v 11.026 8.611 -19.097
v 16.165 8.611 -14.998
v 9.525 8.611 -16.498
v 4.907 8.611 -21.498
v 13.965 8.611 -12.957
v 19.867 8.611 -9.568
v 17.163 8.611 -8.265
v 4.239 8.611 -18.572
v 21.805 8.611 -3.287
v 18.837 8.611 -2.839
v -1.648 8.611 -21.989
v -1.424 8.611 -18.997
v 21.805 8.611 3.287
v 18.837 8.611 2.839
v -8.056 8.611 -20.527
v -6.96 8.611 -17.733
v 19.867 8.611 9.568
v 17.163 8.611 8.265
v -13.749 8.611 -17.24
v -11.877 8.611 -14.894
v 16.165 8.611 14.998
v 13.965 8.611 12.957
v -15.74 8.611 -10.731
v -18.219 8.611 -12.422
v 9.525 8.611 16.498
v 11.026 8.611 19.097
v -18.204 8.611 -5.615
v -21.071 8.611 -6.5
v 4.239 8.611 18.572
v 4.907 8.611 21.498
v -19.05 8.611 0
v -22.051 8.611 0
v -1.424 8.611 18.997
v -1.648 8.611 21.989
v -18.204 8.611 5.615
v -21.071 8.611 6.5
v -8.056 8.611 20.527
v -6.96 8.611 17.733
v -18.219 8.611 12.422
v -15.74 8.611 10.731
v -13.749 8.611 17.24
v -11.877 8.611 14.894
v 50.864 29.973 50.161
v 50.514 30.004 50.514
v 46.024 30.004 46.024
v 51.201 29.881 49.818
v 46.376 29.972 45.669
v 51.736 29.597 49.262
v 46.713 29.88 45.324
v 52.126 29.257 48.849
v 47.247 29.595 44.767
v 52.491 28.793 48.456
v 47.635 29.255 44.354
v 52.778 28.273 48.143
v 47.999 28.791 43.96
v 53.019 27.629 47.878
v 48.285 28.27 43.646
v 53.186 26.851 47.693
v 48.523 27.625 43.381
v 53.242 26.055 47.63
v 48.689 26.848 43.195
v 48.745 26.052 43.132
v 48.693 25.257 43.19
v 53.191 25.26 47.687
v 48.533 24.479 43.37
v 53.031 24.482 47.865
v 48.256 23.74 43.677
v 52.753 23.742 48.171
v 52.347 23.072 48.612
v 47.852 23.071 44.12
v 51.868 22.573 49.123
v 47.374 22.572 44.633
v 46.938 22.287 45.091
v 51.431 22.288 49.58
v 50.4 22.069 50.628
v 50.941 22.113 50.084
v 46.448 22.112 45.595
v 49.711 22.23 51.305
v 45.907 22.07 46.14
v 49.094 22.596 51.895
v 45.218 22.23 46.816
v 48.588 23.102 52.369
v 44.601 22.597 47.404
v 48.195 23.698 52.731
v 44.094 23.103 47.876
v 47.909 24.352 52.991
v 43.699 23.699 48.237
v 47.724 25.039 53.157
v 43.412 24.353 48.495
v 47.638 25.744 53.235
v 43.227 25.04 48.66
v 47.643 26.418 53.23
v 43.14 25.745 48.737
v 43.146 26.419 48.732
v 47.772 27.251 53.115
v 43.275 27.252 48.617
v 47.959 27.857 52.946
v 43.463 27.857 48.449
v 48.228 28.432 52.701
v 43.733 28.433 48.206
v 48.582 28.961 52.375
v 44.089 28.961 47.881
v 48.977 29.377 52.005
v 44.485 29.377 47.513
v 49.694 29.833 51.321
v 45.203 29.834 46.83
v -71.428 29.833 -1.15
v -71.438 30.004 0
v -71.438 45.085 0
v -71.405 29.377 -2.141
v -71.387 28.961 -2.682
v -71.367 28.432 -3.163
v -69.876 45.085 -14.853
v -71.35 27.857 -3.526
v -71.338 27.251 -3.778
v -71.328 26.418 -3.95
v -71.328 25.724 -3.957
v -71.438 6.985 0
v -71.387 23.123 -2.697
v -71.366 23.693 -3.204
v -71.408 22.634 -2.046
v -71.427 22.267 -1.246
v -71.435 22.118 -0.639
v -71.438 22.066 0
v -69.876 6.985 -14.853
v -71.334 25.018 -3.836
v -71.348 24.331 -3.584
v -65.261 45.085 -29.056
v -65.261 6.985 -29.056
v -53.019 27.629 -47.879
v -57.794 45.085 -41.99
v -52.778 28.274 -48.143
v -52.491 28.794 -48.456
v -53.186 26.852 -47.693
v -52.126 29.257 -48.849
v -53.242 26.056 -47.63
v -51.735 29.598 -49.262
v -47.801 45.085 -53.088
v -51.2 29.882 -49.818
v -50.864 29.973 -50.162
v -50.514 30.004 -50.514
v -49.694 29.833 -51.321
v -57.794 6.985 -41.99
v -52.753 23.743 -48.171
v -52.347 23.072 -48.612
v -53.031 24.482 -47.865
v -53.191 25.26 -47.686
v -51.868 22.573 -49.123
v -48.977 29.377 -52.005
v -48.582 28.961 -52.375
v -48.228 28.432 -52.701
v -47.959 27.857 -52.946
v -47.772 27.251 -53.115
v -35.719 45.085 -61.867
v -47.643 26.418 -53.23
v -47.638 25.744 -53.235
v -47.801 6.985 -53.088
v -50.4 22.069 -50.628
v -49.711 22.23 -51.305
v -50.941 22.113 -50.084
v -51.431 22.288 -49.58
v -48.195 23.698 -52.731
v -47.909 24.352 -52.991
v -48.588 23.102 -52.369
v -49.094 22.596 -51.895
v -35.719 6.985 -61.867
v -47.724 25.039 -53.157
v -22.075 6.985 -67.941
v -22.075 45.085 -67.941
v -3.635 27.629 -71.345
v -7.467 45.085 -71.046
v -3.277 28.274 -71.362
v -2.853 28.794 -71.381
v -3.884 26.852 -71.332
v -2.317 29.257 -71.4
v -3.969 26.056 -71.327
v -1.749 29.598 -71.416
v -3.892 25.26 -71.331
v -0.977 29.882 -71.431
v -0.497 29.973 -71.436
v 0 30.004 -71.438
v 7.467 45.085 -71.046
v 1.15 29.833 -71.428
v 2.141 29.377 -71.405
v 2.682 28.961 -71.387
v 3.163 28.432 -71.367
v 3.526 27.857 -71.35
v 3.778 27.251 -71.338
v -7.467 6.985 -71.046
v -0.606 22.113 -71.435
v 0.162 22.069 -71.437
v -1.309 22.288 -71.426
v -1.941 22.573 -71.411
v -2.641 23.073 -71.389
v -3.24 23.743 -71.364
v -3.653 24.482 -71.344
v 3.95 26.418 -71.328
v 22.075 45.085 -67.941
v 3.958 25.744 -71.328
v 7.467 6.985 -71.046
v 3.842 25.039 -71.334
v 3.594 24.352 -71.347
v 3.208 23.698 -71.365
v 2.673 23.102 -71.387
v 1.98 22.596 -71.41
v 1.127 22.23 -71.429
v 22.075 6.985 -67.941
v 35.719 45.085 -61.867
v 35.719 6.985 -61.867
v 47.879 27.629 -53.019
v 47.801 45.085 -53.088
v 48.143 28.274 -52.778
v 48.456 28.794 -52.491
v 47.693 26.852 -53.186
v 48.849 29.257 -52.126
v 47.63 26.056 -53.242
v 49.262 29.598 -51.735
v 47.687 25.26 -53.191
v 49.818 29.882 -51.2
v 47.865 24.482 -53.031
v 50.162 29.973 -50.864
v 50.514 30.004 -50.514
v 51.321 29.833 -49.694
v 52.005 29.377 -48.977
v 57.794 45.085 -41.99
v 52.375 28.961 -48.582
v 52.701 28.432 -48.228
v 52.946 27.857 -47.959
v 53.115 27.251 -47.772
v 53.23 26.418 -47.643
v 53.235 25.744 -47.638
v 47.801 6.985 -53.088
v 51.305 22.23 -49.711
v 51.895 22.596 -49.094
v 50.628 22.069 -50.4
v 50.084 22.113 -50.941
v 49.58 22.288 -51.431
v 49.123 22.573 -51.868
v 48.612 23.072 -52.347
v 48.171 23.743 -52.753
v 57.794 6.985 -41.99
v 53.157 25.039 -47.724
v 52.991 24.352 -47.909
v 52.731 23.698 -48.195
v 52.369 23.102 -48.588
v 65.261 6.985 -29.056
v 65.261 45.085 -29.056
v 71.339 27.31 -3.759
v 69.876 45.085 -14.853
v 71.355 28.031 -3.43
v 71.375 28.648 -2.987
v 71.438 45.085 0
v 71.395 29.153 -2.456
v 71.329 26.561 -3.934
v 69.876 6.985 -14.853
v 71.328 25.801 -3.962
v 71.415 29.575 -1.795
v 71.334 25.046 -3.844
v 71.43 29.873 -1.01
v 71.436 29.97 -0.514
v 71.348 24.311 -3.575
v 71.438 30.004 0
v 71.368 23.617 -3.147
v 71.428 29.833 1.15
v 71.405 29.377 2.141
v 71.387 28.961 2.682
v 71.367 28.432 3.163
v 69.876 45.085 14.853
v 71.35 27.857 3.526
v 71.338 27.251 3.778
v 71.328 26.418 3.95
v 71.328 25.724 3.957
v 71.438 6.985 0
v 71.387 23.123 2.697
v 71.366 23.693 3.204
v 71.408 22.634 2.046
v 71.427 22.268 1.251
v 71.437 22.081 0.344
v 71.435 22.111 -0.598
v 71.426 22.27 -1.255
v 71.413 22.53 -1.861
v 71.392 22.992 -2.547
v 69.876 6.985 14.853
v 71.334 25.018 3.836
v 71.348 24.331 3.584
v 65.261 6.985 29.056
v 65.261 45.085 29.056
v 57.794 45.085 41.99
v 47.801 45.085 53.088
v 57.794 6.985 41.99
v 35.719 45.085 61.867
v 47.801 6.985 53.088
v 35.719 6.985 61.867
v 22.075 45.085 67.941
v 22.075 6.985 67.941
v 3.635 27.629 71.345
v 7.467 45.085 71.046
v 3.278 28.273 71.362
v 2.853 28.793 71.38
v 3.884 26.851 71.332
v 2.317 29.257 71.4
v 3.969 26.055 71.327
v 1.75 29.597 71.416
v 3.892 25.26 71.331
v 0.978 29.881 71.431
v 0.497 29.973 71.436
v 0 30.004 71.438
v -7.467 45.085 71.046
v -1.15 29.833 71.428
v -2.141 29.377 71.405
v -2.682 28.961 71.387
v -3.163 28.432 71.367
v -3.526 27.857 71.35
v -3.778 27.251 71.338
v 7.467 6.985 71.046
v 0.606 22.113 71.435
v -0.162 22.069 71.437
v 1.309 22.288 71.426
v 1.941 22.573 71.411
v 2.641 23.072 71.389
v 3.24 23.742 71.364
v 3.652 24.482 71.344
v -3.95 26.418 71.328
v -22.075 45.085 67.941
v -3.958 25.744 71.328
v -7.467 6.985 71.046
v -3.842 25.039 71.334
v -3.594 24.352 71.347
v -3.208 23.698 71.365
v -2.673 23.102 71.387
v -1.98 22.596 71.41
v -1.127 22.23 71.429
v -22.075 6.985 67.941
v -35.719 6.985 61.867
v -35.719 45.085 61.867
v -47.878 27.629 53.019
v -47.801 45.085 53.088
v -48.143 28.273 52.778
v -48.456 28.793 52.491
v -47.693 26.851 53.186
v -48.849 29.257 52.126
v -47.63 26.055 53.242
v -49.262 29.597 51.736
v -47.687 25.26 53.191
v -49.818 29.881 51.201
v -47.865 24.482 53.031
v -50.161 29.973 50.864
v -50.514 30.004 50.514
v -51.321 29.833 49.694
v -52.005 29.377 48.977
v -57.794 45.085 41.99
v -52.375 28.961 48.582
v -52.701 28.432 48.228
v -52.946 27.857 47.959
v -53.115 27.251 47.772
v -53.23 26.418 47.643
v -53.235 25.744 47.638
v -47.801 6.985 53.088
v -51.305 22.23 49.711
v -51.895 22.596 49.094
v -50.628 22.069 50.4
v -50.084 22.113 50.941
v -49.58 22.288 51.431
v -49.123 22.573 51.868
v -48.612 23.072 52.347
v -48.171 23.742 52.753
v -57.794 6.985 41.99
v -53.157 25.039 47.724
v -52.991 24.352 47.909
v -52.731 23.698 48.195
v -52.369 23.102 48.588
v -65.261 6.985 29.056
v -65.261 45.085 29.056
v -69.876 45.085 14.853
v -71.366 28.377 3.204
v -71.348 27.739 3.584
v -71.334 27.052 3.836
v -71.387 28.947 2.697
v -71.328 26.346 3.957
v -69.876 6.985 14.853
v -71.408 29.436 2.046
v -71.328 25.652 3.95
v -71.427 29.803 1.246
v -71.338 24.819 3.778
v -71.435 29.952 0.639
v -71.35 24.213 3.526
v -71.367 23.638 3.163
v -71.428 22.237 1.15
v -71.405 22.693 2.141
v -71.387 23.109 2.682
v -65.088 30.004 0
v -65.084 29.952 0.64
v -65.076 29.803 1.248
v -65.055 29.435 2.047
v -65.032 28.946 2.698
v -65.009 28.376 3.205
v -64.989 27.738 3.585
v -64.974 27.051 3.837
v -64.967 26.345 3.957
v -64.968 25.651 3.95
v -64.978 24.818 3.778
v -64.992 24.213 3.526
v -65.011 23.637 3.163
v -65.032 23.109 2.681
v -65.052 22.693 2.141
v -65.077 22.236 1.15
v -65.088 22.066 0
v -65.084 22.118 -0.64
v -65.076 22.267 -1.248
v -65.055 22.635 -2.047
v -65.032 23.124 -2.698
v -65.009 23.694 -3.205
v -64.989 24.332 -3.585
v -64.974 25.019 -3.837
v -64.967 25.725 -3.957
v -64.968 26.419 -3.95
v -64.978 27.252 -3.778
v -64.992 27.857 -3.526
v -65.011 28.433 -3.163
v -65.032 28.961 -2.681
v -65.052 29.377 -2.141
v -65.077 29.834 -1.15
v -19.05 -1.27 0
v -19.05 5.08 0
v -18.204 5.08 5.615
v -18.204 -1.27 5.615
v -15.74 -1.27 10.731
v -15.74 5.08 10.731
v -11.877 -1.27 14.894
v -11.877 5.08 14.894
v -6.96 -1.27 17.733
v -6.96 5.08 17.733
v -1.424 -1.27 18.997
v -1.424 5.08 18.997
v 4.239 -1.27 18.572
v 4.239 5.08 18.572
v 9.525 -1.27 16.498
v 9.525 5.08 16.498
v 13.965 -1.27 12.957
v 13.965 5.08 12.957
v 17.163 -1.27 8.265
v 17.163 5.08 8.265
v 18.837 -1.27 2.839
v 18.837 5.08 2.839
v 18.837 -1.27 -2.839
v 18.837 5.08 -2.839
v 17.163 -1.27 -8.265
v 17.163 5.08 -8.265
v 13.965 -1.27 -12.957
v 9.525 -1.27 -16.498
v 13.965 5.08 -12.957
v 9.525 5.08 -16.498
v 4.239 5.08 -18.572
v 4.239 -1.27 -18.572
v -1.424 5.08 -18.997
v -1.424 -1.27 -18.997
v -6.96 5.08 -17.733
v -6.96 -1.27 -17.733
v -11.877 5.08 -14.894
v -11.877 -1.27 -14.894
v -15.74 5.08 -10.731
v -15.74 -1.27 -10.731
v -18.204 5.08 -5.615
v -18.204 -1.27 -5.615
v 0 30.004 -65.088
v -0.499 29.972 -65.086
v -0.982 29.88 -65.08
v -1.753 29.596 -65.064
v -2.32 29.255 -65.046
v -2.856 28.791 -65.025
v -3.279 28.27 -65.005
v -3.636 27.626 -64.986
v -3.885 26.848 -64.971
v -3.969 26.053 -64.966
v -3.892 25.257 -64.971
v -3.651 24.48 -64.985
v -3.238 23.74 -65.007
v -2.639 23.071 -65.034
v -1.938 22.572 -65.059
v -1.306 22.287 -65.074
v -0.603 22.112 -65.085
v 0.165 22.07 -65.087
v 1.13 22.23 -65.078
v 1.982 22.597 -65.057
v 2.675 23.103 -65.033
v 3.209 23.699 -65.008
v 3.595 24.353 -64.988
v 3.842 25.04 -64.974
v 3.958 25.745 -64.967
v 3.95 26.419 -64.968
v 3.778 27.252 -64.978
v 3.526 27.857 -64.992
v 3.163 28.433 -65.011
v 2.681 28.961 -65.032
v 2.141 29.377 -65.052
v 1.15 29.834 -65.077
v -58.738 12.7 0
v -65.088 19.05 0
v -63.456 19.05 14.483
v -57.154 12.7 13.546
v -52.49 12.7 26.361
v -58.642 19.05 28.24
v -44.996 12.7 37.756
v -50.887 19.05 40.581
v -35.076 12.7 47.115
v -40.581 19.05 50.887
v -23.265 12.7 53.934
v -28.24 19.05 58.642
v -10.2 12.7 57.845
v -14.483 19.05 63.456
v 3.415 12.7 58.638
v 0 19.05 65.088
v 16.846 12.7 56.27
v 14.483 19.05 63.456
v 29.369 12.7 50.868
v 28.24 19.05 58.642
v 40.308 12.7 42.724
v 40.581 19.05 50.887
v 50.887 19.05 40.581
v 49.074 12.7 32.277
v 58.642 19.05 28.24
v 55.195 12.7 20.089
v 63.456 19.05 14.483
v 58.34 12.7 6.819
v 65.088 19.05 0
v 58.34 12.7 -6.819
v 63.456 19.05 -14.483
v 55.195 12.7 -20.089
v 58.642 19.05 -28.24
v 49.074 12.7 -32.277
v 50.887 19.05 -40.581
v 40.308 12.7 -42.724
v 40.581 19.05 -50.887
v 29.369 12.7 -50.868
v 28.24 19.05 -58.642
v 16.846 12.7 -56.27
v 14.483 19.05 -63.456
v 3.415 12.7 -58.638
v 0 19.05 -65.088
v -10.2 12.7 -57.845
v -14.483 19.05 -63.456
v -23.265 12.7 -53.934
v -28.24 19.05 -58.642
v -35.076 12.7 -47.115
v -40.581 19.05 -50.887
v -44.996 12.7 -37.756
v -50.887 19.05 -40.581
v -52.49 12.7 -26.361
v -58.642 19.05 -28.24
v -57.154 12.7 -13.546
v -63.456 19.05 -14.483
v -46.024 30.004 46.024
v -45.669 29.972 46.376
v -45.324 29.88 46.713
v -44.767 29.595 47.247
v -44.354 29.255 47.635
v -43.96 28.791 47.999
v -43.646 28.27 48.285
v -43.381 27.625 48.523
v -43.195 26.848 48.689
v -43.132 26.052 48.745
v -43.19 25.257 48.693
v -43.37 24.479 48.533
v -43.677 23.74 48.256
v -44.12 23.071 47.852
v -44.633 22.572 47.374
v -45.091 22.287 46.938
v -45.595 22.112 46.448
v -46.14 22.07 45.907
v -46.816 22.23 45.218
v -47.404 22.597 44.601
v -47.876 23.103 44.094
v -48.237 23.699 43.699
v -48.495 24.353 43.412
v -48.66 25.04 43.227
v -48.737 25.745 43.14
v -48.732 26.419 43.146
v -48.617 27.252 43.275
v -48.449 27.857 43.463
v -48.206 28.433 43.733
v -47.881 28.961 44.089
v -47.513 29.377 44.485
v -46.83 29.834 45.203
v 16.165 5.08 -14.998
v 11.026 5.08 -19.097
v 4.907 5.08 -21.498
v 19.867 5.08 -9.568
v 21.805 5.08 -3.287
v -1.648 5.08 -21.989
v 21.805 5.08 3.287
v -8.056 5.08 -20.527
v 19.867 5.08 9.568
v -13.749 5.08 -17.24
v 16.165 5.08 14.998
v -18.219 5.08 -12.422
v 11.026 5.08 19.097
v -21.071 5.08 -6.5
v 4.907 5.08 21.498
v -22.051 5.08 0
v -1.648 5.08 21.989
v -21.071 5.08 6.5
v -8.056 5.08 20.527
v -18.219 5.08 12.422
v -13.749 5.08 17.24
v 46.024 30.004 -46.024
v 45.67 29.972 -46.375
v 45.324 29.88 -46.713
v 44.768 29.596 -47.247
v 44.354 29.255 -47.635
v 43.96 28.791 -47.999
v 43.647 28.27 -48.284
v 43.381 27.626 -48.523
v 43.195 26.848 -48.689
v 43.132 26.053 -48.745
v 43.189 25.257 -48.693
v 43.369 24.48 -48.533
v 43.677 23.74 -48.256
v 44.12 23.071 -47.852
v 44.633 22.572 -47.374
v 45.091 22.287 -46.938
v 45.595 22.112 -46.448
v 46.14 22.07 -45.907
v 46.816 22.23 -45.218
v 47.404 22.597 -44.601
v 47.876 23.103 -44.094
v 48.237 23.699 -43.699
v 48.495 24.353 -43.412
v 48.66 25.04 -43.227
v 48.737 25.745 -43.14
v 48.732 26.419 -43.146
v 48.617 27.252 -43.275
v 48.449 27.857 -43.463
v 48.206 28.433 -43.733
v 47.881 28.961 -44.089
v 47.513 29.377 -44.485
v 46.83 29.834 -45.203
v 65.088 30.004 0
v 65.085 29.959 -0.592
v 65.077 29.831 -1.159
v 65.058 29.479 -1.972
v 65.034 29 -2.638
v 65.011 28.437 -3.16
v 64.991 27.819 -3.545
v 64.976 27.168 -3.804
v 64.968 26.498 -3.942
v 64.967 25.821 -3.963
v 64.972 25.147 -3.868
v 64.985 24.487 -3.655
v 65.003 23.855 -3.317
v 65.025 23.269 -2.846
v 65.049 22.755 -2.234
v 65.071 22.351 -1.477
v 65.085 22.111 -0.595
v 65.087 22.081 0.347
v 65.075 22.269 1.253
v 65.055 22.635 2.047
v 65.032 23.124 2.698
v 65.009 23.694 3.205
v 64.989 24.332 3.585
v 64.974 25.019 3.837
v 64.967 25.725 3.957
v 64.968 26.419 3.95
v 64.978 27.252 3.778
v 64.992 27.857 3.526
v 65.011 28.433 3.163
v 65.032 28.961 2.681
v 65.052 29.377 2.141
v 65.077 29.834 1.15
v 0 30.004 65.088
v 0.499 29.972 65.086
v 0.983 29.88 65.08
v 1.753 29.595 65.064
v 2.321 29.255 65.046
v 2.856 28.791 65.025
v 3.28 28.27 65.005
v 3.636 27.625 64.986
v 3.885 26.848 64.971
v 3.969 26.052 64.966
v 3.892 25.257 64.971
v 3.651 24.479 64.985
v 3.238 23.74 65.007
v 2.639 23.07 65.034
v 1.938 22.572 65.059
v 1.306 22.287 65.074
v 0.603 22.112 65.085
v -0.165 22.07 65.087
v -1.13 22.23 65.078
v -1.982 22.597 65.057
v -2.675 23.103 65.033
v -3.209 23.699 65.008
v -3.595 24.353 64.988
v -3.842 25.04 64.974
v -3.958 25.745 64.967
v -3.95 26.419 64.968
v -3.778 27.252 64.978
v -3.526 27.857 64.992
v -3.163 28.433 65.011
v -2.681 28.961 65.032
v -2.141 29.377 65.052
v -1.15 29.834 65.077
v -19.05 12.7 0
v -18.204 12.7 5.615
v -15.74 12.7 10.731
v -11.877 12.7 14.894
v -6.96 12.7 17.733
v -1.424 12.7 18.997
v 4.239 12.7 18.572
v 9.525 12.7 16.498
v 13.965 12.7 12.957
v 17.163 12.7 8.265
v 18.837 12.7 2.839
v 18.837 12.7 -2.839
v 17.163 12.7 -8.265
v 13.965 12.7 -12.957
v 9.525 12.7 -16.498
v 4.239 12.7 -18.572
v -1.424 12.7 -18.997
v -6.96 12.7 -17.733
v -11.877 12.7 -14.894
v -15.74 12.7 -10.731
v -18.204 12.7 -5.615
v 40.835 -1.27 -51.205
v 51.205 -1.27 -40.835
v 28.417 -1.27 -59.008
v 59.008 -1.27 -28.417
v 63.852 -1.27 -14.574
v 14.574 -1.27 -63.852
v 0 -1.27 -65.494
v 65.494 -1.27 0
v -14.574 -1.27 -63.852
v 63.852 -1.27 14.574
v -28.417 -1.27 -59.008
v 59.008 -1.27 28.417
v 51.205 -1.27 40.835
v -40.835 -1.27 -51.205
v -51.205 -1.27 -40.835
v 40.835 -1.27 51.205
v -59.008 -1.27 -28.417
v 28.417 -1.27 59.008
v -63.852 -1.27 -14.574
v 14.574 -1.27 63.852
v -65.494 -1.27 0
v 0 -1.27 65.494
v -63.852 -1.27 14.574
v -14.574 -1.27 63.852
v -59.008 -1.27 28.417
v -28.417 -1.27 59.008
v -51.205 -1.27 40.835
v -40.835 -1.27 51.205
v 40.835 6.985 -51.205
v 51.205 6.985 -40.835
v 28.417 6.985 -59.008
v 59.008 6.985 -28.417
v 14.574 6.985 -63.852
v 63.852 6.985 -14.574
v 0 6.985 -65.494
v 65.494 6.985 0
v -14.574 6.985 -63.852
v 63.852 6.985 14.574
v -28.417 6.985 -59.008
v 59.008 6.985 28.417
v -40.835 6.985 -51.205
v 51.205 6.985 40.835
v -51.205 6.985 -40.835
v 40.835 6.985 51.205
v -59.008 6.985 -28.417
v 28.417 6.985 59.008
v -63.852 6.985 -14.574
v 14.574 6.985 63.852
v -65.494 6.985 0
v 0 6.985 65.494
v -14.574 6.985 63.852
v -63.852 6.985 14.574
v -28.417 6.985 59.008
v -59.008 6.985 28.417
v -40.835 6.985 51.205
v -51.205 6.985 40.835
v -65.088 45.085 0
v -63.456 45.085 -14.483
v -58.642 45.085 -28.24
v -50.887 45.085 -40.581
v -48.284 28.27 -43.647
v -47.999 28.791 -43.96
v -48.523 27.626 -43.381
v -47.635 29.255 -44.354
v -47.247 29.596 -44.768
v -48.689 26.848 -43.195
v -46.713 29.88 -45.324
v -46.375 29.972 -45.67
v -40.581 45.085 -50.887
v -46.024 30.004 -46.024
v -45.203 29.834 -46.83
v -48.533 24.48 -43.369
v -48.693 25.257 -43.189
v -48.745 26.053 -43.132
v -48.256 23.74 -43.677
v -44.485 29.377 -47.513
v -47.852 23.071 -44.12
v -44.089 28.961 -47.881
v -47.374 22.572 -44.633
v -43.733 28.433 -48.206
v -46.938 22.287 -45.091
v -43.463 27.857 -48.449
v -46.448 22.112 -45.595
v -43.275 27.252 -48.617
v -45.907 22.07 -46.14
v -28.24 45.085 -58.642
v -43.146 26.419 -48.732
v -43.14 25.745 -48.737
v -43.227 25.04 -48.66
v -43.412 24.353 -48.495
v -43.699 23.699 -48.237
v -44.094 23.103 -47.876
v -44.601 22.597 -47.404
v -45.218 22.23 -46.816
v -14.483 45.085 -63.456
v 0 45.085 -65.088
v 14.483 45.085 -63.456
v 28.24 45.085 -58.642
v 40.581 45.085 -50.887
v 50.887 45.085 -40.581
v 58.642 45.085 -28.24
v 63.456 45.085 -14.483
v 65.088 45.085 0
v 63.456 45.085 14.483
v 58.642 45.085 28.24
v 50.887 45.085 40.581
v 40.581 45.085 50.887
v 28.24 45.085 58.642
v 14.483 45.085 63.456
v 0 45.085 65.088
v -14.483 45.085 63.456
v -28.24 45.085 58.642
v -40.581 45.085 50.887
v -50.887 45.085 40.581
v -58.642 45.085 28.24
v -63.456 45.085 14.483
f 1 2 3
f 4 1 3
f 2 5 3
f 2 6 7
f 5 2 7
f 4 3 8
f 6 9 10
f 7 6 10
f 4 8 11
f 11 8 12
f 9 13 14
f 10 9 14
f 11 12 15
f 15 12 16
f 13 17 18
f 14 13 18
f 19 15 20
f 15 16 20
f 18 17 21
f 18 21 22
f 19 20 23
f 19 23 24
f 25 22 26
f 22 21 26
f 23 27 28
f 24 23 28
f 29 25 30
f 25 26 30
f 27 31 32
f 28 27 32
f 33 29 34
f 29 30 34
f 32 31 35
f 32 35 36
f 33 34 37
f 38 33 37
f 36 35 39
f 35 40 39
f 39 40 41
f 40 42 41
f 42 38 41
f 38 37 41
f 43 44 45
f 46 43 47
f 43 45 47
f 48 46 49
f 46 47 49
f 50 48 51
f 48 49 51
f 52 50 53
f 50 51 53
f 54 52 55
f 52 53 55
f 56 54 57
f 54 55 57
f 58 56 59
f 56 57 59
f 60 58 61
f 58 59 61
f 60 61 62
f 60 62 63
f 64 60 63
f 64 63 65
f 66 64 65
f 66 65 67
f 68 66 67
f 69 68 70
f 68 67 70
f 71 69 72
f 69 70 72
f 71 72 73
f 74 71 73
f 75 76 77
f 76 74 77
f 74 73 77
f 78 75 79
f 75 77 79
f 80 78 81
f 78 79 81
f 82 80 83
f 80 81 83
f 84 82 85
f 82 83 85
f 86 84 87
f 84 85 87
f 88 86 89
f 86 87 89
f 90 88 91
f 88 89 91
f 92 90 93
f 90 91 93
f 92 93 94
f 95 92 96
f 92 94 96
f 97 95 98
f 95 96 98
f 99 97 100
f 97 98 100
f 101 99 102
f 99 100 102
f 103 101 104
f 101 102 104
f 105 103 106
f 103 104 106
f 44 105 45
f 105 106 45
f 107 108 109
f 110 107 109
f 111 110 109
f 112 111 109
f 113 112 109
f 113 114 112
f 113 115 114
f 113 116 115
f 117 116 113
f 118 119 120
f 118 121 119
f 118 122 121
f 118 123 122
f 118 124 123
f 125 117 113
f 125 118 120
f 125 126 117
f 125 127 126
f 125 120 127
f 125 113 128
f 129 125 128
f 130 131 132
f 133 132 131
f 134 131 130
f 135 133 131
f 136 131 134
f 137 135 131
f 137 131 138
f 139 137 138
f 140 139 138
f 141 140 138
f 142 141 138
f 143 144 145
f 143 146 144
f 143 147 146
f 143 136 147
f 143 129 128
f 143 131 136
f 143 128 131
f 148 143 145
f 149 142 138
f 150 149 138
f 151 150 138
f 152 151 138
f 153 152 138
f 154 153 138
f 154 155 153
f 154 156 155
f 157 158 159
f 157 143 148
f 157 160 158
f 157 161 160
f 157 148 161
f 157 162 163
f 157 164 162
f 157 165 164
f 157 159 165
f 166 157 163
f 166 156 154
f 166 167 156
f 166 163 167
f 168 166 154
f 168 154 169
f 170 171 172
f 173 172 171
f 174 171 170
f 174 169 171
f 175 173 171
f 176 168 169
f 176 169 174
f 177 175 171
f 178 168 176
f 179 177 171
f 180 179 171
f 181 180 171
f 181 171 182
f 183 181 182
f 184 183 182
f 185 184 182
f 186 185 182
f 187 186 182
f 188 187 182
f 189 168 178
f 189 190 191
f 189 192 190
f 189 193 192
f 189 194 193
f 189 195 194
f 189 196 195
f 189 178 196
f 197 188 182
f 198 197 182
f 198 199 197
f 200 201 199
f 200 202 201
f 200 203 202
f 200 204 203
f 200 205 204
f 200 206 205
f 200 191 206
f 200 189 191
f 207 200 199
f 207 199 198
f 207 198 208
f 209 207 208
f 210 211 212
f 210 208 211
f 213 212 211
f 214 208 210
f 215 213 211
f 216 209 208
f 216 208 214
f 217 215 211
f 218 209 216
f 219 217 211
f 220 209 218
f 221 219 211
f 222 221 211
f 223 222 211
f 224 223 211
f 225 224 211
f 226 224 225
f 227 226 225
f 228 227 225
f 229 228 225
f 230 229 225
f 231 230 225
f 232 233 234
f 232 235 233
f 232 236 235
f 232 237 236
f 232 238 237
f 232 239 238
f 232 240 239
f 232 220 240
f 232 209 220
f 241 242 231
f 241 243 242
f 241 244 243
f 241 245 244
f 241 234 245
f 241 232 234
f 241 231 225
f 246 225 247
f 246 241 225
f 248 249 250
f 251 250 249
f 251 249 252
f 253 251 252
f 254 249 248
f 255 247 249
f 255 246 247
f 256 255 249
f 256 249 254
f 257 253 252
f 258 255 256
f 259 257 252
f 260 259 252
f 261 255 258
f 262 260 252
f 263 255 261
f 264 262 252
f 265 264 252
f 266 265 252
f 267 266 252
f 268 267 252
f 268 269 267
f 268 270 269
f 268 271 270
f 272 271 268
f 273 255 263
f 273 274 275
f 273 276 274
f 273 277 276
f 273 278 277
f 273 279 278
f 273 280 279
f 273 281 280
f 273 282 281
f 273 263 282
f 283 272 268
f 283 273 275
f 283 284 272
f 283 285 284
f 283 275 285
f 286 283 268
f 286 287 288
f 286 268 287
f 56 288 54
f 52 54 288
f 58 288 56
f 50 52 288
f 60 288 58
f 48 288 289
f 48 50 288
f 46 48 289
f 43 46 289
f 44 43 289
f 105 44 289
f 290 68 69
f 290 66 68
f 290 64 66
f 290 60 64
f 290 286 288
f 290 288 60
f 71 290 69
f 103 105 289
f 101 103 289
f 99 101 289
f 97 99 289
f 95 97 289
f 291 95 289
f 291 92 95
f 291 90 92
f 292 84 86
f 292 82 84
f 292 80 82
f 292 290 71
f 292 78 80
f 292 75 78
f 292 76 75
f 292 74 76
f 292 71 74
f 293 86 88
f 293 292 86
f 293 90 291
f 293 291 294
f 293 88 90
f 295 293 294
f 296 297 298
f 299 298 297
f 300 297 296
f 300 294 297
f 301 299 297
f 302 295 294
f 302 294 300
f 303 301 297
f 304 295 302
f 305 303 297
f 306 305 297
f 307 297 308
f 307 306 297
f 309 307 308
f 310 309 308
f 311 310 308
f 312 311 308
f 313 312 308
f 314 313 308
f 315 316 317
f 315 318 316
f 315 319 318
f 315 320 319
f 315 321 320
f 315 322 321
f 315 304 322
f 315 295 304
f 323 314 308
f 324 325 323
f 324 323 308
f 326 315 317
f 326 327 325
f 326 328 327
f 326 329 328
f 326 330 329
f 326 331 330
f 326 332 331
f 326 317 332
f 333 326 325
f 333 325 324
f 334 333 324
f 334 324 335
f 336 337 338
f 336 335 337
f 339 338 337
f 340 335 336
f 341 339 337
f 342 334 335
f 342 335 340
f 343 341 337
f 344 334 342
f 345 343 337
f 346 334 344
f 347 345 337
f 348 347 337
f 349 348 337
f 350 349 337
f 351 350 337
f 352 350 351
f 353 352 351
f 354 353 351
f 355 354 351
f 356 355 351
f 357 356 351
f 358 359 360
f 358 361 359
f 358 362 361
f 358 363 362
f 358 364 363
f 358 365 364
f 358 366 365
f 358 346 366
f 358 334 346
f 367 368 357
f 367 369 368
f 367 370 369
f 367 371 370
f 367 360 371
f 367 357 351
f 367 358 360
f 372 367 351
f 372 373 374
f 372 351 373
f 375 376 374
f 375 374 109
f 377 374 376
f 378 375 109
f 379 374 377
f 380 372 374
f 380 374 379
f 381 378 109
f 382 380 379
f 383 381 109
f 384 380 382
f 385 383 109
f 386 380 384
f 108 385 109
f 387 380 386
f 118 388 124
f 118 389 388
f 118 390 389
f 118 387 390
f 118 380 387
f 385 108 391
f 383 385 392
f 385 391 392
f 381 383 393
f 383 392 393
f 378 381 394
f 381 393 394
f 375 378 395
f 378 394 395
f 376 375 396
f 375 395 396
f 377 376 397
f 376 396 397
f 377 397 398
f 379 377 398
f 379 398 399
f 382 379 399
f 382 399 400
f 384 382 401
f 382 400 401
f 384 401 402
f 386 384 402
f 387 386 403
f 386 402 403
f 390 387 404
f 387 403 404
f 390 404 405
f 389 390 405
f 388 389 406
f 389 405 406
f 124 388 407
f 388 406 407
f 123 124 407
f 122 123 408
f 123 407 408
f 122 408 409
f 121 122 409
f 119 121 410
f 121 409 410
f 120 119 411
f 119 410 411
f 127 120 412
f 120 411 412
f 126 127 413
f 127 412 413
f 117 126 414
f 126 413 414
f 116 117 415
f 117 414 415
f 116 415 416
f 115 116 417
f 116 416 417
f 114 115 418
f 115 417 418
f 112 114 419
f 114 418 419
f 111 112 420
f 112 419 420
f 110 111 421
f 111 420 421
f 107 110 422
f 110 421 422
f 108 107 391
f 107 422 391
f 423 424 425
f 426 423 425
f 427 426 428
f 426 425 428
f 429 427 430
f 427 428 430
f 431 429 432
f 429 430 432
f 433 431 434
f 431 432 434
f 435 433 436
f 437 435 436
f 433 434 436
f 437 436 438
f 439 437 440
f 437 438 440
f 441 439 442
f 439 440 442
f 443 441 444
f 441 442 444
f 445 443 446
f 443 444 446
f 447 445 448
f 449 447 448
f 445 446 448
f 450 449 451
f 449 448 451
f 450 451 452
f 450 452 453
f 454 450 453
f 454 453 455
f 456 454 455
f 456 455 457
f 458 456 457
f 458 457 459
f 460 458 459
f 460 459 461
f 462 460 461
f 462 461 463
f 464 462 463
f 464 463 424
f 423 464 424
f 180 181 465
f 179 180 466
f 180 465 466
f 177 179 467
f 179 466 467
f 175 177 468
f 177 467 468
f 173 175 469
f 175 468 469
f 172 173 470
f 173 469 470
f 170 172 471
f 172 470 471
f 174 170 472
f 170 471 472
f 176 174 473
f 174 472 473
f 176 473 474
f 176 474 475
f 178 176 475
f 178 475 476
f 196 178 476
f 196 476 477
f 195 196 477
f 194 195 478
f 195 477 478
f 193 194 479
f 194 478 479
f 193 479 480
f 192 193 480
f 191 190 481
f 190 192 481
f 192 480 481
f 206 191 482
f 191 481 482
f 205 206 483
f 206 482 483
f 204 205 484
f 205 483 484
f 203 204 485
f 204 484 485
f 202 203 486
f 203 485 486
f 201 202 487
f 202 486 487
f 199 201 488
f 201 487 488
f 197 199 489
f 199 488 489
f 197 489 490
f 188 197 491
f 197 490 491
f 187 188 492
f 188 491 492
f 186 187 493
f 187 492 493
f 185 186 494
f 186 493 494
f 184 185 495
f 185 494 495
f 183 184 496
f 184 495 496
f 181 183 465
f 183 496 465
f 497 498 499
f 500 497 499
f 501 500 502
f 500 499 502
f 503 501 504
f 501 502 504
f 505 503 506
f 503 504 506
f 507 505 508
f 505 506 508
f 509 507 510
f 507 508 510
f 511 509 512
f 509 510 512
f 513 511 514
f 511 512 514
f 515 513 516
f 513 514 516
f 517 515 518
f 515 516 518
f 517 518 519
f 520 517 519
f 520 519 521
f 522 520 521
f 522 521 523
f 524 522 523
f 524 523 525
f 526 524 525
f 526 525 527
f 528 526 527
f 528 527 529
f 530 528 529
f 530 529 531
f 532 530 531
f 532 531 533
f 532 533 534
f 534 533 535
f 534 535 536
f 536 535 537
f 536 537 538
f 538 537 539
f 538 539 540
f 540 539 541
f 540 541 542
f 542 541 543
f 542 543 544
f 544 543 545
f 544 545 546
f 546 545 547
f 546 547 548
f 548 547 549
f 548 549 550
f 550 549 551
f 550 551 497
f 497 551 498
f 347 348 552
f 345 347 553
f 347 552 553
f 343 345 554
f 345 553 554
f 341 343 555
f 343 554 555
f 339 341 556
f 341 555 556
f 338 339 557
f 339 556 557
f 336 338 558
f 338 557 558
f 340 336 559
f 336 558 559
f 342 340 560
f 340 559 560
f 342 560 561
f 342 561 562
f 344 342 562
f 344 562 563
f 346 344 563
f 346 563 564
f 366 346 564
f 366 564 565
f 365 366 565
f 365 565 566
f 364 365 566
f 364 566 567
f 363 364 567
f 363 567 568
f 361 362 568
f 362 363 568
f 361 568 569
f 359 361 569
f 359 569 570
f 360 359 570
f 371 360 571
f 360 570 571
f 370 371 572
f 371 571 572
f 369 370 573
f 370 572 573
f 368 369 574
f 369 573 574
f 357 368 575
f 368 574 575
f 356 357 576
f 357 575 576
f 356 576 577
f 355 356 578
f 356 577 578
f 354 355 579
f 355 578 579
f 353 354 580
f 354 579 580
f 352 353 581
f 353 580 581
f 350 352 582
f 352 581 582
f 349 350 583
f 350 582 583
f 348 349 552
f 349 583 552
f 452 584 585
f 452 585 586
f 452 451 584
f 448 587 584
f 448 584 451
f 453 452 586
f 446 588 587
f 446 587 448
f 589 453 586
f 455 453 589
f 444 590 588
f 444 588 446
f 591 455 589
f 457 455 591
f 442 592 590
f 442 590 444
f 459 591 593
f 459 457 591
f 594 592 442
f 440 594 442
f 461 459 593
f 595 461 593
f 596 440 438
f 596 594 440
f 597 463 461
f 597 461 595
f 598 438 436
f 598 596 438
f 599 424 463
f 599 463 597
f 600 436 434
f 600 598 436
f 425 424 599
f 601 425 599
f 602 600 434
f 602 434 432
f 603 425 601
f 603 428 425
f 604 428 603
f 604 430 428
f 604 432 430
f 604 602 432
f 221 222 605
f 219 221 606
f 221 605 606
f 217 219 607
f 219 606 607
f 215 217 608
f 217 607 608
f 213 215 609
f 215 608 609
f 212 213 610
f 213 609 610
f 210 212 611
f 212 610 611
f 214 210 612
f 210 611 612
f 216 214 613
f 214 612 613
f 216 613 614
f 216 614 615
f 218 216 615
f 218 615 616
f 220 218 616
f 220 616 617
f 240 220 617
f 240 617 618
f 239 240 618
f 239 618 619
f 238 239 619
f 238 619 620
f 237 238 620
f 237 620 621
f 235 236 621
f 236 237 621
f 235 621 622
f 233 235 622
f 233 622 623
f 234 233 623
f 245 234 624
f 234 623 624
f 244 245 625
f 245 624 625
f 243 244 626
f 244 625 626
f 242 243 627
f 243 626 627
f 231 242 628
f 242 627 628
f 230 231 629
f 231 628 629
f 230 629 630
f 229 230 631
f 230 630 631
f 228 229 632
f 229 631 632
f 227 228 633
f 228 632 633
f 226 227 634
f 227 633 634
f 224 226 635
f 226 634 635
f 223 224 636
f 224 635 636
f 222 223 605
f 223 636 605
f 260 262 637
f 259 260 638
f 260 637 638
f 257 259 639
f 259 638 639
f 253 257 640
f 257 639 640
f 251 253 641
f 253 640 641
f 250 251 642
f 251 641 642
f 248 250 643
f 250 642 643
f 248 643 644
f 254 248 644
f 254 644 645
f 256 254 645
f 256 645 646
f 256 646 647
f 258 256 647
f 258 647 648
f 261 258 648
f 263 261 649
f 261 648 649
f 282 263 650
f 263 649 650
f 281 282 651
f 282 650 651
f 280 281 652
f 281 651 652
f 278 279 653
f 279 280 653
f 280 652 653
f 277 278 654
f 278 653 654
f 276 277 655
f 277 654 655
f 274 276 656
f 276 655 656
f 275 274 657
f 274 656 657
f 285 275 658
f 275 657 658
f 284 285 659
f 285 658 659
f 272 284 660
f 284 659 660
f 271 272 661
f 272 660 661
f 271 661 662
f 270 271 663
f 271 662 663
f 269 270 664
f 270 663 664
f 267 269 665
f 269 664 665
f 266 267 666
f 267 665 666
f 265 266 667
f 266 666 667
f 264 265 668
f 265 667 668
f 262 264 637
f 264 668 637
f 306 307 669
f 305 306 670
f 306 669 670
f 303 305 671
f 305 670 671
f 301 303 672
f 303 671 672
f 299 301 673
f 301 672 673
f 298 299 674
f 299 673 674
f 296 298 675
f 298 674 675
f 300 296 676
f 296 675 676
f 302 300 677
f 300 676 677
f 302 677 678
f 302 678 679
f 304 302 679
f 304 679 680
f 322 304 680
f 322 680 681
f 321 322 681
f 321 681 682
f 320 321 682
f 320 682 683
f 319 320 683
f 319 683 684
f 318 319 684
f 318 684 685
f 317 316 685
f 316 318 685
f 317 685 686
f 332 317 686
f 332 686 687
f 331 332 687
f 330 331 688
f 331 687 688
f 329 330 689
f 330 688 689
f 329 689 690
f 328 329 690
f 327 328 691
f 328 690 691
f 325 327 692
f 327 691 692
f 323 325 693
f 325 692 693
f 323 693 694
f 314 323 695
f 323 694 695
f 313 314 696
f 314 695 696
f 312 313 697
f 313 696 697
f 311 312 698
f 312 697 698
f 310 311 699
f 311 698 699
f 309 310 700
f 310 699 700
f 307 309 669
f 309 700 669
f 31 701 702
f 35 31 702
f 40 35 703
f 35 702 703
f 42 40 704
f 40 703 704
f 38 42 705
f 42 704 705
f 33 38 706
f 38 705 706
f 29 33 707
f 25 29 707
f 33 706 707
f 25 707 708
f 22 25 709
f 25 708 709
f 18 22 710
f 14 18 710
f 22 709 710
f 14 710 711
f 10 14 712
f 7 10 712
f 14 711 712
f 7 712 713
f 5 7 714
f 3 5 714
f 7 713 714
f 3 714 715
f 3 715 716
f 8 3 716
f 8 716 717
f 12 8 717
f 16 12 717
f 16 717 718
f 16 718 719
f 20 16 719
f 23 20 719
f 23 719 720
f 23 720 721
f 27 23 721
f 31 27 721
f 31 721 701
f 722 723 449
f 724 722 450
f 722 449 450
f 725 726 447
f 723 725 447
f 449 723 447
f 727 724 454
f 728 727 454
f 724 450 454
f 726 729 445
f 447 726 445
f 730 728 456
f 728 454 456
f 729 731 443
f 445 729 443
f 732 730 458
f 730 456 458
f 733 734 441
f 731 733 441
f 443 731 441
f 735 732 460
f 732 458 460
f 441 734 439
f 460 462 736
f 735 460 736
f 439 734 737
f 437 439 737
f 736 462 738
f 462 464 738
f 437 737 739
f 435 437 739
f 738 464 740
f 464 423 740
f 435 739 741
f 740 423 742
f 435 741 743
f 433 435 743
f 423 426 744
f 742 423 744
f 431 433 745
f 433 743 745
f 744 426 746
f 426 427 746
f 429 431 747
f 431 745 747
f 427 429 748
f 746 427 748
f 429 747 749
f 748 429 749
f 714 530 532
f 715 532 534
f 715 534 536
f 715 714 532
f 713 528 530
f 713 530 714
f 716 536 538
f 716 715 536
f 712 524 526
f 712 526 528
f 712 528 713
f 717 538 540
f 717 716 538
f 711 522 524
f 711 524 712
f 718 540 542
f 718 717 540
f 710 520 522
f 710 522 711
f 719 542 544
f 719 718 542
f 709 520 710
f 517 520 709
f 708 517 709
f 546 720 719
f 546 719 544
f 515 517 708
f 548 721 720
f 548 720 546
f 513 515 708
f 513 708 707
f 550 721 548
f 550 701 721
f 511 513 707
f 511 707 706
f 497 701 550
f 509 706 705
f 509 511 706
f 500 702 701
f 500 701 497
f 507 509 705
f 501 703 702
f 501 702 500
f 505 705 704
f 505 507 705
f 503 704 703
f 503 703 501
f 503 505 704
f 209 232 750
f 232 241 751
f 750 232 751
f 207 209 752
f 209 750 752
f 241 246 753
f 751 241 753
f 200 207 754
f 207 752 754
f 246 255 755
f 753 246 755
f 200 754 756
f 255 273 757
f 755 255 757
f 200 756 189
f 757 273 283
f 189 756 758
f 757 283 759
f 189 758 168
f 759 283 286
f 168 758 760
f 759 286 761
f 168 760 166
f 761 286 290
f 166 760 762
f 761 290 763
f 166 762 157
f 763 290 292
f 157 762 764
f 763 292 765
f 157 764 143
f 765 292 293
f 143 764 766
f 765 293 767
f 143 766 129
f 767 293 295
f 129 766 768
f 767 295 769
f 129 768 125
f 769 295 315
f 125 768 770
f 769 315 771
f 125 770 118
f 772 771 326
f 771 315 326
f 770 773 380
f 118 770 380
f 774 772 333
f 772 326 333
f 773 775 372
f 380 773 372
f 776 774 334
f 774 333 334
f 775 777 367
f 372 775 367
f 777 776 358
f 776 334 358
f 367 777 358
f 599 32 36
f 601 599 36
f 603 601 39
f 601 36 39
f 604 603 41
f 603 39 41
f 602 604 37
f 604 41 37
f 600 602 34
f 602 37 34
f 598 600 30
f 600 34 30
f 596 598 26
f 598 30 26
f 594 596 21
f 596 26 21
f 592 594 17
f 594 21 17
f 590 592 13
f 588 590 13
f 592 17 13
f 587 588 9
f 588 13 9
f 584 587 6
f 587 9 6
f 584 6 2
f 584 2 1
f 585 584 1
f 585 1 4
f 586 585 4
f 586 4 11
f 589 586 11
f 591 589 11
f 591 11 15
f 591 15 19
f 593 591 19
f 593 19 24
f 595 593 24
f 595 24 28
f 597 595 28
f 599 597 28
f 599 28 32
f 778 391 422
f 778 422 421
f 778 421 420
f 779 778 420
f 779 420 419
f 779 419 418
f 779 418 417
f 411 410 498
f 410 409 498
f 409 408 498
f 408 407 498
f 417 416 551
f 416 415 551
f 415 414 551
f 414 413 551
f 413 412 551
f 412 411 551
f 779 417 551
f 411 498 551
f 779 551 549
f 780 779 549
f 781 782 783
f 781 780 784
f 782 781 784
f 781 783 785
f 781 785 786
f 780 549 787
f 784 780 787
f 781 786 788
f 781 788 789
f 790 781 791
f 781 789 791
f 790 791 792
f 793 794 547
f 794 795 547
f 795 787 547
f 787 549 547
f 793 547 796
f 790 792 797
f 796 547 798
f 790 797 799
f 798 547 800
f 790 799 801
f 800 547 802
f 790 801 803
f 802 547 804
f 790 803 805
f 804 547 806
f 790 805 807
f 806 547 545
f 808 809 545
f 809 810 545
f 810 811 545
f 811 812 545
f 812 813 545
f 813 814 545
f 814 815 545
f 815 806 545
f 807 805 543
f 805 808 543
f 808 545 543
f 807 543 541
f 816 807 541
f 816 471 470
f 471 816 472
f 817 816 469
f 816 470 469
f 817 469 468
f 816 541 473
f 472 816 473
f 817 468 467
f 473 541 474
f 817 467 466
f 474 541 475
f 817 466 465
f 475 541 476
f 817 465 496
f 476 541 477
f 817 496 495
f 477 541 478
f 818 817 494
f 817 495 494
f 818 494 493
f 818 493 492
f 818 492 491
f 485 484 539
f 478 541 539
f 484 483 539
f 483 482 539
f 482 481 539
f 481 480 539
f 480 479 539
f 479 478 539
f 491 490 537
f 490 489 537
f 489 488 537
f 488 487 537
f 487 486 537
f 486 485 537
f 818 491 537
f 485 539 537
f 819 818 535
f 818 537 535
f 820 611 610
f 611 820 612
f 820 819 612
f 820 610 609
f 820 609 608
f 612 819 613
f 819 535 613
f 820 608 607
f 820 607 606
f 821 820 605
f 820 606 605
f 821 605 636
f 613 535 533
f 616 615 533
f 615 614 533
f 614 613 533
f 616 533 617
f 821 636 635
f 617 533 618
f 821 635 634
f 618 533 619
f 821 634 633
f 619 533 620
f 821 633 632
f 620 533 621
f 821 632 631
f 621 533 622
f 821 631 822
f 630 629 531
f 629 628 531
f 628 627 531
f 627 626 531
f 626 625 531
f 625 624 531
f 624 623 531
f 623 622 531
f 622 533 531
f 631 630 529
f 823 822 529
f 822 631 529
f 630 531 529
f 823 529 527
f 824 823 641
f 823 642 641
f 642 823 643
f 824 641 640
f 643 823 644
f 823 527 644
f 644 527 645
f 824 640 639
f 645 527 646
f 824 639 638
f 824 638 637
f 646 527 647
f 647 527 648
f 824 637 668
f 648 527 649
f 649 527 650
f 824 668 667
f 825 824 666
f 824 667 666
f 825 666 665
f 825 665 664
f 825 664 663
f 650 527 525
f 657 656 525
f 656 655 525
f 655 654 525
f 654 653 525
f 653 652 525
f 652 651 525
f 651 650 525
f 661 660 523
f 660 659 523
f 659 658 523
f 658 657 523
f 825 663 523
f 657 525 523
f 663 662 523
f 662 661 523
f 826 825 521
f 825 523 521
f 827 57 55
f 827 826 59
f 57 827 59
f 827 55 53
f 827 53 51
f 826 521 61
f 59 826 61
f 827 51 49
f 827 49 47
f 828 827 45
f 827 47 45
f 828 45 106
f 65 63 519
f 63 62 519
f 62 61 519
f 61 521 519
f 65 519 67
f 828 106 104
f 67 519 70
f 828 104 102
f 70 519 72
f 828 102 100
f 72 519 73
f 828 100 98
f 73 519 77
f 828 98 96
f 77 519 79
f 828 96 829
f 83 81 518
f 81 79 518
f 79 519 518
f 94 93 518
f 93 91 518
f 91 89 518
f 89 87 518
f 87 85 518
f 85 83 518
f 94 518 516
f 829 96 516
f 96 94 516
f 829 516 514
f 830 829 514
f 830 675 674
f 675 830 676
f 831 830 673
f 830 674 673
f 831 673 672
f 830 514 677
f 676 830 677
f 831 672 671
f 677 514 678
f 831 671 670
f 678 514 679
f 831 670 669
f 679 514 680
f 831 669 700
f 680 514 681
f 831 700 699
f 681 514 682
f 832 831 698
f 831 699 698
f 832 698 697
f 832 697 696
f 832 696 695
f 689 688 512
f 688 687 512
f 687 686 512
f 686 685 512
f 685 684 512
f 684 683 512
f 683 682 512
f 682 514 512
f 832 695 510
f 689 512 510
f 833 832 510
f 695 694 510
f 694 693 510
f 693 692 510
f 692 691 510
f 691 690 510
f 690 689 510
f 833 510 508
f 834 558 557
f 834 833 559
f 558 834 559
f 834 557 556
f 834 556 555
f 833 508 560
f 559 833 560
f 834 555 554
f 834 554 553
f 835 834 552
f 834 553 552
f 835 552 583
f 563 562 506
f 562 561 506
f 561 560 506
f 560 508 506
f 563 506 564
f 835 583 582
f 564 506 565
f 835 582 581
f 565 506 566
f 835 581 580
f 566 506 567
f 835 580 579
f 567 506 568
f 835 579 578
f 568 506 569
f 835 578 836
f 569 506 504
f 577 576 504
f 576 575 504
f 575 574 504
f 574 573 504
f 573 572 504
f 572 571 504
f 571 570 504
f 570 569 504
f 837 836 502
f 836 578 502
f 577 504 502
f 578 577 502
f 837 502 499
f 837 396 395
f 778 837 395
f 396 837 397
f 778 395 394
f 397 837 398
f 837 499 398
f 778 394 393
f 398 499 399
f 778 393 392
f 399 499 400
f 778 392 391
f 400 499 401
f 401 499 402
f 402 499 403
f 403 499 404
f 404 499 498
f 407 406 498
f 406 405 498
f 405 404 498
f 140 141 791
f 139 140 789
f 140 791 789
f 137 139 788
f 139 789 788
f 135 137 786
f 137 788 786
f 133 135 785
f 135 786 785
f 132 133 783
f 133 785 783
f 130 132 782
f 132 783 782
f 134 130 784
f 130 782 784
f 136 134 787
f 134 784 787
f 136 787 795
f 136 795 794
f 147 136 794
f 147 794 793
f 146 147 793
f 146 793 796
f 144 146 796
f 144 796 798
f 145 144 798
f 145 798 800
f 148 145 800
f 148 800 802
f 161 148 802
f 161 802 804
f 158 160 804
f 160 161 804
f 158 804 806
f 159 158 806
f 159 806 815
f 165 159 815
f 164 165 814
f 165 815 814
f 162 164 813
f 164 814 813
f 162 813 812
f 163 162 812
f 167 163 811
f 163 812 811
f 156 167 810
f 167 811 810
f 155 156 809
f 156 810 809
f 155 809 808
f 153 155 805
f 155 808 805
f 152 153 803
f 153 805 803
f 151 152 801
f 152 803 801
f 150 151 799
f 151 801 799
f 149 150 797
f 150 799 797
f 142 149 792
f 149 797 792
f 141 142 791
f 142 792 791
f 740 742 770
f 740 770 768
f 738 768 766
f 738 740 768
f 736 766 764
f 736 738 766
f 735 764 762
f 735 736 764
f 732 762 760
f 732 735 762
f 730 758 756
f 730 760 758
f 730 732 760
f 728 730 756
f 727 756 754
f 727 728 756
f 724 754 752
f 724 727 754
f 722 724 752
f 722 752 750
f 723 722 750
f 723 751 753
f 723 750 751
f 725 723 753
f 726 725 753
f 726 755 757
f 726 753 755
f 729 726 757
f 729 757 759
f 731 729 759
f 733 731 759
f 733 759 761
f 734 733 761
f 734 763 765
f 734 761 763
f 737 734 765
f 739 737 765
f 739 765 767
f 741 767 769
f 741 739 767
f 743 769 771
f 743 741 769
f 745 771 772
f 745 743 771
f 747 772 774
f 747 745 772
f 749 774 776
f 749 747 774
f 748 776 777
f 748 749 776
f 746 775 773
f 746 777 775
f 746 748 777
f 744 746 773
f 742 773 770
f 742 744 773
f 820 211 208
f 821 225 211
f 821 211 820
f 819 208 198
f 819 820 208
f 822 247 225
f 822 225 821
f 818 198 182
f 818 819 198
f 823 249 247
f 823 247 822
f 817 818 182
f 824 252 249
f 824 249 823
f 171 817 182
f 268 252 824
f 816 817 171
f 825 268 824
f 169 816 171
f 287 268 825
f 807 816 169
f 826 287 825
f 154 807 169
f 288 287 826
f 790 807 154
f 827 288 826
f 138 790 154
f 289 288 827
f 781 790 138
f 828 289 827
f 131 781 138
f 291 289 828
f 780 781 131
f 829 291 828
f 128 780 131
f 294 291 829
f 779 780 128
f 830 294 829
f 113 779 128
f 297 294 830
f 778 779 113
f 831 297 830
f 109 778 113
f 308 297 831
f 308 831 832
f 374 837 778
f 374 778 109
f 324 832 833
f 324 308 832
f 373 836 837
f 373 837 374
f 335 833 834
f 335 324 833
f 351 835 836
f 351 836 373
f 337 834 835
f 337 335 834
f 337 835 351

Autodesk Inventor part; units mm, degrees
ref_plane "YZ Plane" through (0, 0, 0) normal (1, 0, 0) x (0, 1, 0)
ref_plane "XZ Plane" through (0, 0, 0) normal (0, 1, 0) x (-1, 0, 0)
ref_plane "XY Plane" through (0, 0, 0) normal (0, 0, 1) x (1, 0, 0)
sketch "Sketch1" plane through (0, 0, 0) normal (0, 0, 1) x (1, 0, 0)
  line L0 (-71.4375, 45.085) -> (-65.0875, 45.085)
  line L1 (-19.05, 0) -> (-19.05, 5.08)
  line L2 (-19.05, 5.08) -> (-22.051, 5.08)
  line L3 (-22.051, 5.08) -> (-22.051, 8.6106)
  line L4 (-22.051, 8.6106) -> (-19.05, 8.6106)
  line L5 (-19.05, 0) -> (-19.05, 5.08)
  line L6 (-19.05, 8.6106) -> (-19.05, 12.7)
  line L7 (0, 0) -> (0, 17.0653)
  line L8 (-71.4375, 6.985) -> (-65.4939, 6.985)
  line L9 (-65.4939, 6.985) -> (-65.4939, 0)
  line L10 (-71.4375, 45.085) -> (-71.4375, 6.985)
  line L11 (-65.4939, 0) -> (-65.4939, -1.27)
  line L12 (-65.4939, -1.27) -> (-19.05, -1.27)
  line L13 (-19.05, -1.27) -> (-19.05, 0)
  line L14 (-65.0875, 19.05) -> (-58.7375, 12.7)
  line L15 (-65.0875, 45.085) -> (-65.0875, 19.05)
  line L16 (-58.7375, 12.7) -> (-19.05, 12.7)
  dimension "d3" = 19.05
  dimension "d8" = 12.7
  dimension "d9" = 5.08
  dimension "d10" = 3.001
  dimension "d11" = 3.5306
  dimension "d12" = 4.0894
  dimension "d26" = 5.9436
  dimension "d28" = 1.27
  dimension "d29" = 6.985
  dimension "d30" = 38.1
  dimension "d31" = 46.4439
  dimension "d32" = 1.27
  dimension "d35" = 39.6875
  dimension "d37" = 135
  dimension "d40" = 71.4375
  dimension "d41" = 20.32
  dimension "d42" = 26.035
revolve "Revolution3" add sketch "Sketch1" angle 360 about axis through (0, 0, 0) along (0, 1, 0)
sketch "Sketch2" plane through (0, 0, 0) normal (1, 0, 0) x (0, 1, 0)
  line L0 (45.085, -65.0875) -> (45.085, 65.0875) projected
  circle A0 centre (26.035, 0) radius 3.9688
  point P0 (0, 0)
  dimension "d45" = 7.9375
extrude "Extrusion1" cut sketch "Sketch2" along normal blind 207.9625
pattern_circular "Circular Pattern1" count 8 over 360 about axis through (0, 32.0675, 0) along (0, 1, 0) of "Extrusion1"
properties part number "Forward Closure" material "Aluminum 6061 T6 0 Cold Formed"
